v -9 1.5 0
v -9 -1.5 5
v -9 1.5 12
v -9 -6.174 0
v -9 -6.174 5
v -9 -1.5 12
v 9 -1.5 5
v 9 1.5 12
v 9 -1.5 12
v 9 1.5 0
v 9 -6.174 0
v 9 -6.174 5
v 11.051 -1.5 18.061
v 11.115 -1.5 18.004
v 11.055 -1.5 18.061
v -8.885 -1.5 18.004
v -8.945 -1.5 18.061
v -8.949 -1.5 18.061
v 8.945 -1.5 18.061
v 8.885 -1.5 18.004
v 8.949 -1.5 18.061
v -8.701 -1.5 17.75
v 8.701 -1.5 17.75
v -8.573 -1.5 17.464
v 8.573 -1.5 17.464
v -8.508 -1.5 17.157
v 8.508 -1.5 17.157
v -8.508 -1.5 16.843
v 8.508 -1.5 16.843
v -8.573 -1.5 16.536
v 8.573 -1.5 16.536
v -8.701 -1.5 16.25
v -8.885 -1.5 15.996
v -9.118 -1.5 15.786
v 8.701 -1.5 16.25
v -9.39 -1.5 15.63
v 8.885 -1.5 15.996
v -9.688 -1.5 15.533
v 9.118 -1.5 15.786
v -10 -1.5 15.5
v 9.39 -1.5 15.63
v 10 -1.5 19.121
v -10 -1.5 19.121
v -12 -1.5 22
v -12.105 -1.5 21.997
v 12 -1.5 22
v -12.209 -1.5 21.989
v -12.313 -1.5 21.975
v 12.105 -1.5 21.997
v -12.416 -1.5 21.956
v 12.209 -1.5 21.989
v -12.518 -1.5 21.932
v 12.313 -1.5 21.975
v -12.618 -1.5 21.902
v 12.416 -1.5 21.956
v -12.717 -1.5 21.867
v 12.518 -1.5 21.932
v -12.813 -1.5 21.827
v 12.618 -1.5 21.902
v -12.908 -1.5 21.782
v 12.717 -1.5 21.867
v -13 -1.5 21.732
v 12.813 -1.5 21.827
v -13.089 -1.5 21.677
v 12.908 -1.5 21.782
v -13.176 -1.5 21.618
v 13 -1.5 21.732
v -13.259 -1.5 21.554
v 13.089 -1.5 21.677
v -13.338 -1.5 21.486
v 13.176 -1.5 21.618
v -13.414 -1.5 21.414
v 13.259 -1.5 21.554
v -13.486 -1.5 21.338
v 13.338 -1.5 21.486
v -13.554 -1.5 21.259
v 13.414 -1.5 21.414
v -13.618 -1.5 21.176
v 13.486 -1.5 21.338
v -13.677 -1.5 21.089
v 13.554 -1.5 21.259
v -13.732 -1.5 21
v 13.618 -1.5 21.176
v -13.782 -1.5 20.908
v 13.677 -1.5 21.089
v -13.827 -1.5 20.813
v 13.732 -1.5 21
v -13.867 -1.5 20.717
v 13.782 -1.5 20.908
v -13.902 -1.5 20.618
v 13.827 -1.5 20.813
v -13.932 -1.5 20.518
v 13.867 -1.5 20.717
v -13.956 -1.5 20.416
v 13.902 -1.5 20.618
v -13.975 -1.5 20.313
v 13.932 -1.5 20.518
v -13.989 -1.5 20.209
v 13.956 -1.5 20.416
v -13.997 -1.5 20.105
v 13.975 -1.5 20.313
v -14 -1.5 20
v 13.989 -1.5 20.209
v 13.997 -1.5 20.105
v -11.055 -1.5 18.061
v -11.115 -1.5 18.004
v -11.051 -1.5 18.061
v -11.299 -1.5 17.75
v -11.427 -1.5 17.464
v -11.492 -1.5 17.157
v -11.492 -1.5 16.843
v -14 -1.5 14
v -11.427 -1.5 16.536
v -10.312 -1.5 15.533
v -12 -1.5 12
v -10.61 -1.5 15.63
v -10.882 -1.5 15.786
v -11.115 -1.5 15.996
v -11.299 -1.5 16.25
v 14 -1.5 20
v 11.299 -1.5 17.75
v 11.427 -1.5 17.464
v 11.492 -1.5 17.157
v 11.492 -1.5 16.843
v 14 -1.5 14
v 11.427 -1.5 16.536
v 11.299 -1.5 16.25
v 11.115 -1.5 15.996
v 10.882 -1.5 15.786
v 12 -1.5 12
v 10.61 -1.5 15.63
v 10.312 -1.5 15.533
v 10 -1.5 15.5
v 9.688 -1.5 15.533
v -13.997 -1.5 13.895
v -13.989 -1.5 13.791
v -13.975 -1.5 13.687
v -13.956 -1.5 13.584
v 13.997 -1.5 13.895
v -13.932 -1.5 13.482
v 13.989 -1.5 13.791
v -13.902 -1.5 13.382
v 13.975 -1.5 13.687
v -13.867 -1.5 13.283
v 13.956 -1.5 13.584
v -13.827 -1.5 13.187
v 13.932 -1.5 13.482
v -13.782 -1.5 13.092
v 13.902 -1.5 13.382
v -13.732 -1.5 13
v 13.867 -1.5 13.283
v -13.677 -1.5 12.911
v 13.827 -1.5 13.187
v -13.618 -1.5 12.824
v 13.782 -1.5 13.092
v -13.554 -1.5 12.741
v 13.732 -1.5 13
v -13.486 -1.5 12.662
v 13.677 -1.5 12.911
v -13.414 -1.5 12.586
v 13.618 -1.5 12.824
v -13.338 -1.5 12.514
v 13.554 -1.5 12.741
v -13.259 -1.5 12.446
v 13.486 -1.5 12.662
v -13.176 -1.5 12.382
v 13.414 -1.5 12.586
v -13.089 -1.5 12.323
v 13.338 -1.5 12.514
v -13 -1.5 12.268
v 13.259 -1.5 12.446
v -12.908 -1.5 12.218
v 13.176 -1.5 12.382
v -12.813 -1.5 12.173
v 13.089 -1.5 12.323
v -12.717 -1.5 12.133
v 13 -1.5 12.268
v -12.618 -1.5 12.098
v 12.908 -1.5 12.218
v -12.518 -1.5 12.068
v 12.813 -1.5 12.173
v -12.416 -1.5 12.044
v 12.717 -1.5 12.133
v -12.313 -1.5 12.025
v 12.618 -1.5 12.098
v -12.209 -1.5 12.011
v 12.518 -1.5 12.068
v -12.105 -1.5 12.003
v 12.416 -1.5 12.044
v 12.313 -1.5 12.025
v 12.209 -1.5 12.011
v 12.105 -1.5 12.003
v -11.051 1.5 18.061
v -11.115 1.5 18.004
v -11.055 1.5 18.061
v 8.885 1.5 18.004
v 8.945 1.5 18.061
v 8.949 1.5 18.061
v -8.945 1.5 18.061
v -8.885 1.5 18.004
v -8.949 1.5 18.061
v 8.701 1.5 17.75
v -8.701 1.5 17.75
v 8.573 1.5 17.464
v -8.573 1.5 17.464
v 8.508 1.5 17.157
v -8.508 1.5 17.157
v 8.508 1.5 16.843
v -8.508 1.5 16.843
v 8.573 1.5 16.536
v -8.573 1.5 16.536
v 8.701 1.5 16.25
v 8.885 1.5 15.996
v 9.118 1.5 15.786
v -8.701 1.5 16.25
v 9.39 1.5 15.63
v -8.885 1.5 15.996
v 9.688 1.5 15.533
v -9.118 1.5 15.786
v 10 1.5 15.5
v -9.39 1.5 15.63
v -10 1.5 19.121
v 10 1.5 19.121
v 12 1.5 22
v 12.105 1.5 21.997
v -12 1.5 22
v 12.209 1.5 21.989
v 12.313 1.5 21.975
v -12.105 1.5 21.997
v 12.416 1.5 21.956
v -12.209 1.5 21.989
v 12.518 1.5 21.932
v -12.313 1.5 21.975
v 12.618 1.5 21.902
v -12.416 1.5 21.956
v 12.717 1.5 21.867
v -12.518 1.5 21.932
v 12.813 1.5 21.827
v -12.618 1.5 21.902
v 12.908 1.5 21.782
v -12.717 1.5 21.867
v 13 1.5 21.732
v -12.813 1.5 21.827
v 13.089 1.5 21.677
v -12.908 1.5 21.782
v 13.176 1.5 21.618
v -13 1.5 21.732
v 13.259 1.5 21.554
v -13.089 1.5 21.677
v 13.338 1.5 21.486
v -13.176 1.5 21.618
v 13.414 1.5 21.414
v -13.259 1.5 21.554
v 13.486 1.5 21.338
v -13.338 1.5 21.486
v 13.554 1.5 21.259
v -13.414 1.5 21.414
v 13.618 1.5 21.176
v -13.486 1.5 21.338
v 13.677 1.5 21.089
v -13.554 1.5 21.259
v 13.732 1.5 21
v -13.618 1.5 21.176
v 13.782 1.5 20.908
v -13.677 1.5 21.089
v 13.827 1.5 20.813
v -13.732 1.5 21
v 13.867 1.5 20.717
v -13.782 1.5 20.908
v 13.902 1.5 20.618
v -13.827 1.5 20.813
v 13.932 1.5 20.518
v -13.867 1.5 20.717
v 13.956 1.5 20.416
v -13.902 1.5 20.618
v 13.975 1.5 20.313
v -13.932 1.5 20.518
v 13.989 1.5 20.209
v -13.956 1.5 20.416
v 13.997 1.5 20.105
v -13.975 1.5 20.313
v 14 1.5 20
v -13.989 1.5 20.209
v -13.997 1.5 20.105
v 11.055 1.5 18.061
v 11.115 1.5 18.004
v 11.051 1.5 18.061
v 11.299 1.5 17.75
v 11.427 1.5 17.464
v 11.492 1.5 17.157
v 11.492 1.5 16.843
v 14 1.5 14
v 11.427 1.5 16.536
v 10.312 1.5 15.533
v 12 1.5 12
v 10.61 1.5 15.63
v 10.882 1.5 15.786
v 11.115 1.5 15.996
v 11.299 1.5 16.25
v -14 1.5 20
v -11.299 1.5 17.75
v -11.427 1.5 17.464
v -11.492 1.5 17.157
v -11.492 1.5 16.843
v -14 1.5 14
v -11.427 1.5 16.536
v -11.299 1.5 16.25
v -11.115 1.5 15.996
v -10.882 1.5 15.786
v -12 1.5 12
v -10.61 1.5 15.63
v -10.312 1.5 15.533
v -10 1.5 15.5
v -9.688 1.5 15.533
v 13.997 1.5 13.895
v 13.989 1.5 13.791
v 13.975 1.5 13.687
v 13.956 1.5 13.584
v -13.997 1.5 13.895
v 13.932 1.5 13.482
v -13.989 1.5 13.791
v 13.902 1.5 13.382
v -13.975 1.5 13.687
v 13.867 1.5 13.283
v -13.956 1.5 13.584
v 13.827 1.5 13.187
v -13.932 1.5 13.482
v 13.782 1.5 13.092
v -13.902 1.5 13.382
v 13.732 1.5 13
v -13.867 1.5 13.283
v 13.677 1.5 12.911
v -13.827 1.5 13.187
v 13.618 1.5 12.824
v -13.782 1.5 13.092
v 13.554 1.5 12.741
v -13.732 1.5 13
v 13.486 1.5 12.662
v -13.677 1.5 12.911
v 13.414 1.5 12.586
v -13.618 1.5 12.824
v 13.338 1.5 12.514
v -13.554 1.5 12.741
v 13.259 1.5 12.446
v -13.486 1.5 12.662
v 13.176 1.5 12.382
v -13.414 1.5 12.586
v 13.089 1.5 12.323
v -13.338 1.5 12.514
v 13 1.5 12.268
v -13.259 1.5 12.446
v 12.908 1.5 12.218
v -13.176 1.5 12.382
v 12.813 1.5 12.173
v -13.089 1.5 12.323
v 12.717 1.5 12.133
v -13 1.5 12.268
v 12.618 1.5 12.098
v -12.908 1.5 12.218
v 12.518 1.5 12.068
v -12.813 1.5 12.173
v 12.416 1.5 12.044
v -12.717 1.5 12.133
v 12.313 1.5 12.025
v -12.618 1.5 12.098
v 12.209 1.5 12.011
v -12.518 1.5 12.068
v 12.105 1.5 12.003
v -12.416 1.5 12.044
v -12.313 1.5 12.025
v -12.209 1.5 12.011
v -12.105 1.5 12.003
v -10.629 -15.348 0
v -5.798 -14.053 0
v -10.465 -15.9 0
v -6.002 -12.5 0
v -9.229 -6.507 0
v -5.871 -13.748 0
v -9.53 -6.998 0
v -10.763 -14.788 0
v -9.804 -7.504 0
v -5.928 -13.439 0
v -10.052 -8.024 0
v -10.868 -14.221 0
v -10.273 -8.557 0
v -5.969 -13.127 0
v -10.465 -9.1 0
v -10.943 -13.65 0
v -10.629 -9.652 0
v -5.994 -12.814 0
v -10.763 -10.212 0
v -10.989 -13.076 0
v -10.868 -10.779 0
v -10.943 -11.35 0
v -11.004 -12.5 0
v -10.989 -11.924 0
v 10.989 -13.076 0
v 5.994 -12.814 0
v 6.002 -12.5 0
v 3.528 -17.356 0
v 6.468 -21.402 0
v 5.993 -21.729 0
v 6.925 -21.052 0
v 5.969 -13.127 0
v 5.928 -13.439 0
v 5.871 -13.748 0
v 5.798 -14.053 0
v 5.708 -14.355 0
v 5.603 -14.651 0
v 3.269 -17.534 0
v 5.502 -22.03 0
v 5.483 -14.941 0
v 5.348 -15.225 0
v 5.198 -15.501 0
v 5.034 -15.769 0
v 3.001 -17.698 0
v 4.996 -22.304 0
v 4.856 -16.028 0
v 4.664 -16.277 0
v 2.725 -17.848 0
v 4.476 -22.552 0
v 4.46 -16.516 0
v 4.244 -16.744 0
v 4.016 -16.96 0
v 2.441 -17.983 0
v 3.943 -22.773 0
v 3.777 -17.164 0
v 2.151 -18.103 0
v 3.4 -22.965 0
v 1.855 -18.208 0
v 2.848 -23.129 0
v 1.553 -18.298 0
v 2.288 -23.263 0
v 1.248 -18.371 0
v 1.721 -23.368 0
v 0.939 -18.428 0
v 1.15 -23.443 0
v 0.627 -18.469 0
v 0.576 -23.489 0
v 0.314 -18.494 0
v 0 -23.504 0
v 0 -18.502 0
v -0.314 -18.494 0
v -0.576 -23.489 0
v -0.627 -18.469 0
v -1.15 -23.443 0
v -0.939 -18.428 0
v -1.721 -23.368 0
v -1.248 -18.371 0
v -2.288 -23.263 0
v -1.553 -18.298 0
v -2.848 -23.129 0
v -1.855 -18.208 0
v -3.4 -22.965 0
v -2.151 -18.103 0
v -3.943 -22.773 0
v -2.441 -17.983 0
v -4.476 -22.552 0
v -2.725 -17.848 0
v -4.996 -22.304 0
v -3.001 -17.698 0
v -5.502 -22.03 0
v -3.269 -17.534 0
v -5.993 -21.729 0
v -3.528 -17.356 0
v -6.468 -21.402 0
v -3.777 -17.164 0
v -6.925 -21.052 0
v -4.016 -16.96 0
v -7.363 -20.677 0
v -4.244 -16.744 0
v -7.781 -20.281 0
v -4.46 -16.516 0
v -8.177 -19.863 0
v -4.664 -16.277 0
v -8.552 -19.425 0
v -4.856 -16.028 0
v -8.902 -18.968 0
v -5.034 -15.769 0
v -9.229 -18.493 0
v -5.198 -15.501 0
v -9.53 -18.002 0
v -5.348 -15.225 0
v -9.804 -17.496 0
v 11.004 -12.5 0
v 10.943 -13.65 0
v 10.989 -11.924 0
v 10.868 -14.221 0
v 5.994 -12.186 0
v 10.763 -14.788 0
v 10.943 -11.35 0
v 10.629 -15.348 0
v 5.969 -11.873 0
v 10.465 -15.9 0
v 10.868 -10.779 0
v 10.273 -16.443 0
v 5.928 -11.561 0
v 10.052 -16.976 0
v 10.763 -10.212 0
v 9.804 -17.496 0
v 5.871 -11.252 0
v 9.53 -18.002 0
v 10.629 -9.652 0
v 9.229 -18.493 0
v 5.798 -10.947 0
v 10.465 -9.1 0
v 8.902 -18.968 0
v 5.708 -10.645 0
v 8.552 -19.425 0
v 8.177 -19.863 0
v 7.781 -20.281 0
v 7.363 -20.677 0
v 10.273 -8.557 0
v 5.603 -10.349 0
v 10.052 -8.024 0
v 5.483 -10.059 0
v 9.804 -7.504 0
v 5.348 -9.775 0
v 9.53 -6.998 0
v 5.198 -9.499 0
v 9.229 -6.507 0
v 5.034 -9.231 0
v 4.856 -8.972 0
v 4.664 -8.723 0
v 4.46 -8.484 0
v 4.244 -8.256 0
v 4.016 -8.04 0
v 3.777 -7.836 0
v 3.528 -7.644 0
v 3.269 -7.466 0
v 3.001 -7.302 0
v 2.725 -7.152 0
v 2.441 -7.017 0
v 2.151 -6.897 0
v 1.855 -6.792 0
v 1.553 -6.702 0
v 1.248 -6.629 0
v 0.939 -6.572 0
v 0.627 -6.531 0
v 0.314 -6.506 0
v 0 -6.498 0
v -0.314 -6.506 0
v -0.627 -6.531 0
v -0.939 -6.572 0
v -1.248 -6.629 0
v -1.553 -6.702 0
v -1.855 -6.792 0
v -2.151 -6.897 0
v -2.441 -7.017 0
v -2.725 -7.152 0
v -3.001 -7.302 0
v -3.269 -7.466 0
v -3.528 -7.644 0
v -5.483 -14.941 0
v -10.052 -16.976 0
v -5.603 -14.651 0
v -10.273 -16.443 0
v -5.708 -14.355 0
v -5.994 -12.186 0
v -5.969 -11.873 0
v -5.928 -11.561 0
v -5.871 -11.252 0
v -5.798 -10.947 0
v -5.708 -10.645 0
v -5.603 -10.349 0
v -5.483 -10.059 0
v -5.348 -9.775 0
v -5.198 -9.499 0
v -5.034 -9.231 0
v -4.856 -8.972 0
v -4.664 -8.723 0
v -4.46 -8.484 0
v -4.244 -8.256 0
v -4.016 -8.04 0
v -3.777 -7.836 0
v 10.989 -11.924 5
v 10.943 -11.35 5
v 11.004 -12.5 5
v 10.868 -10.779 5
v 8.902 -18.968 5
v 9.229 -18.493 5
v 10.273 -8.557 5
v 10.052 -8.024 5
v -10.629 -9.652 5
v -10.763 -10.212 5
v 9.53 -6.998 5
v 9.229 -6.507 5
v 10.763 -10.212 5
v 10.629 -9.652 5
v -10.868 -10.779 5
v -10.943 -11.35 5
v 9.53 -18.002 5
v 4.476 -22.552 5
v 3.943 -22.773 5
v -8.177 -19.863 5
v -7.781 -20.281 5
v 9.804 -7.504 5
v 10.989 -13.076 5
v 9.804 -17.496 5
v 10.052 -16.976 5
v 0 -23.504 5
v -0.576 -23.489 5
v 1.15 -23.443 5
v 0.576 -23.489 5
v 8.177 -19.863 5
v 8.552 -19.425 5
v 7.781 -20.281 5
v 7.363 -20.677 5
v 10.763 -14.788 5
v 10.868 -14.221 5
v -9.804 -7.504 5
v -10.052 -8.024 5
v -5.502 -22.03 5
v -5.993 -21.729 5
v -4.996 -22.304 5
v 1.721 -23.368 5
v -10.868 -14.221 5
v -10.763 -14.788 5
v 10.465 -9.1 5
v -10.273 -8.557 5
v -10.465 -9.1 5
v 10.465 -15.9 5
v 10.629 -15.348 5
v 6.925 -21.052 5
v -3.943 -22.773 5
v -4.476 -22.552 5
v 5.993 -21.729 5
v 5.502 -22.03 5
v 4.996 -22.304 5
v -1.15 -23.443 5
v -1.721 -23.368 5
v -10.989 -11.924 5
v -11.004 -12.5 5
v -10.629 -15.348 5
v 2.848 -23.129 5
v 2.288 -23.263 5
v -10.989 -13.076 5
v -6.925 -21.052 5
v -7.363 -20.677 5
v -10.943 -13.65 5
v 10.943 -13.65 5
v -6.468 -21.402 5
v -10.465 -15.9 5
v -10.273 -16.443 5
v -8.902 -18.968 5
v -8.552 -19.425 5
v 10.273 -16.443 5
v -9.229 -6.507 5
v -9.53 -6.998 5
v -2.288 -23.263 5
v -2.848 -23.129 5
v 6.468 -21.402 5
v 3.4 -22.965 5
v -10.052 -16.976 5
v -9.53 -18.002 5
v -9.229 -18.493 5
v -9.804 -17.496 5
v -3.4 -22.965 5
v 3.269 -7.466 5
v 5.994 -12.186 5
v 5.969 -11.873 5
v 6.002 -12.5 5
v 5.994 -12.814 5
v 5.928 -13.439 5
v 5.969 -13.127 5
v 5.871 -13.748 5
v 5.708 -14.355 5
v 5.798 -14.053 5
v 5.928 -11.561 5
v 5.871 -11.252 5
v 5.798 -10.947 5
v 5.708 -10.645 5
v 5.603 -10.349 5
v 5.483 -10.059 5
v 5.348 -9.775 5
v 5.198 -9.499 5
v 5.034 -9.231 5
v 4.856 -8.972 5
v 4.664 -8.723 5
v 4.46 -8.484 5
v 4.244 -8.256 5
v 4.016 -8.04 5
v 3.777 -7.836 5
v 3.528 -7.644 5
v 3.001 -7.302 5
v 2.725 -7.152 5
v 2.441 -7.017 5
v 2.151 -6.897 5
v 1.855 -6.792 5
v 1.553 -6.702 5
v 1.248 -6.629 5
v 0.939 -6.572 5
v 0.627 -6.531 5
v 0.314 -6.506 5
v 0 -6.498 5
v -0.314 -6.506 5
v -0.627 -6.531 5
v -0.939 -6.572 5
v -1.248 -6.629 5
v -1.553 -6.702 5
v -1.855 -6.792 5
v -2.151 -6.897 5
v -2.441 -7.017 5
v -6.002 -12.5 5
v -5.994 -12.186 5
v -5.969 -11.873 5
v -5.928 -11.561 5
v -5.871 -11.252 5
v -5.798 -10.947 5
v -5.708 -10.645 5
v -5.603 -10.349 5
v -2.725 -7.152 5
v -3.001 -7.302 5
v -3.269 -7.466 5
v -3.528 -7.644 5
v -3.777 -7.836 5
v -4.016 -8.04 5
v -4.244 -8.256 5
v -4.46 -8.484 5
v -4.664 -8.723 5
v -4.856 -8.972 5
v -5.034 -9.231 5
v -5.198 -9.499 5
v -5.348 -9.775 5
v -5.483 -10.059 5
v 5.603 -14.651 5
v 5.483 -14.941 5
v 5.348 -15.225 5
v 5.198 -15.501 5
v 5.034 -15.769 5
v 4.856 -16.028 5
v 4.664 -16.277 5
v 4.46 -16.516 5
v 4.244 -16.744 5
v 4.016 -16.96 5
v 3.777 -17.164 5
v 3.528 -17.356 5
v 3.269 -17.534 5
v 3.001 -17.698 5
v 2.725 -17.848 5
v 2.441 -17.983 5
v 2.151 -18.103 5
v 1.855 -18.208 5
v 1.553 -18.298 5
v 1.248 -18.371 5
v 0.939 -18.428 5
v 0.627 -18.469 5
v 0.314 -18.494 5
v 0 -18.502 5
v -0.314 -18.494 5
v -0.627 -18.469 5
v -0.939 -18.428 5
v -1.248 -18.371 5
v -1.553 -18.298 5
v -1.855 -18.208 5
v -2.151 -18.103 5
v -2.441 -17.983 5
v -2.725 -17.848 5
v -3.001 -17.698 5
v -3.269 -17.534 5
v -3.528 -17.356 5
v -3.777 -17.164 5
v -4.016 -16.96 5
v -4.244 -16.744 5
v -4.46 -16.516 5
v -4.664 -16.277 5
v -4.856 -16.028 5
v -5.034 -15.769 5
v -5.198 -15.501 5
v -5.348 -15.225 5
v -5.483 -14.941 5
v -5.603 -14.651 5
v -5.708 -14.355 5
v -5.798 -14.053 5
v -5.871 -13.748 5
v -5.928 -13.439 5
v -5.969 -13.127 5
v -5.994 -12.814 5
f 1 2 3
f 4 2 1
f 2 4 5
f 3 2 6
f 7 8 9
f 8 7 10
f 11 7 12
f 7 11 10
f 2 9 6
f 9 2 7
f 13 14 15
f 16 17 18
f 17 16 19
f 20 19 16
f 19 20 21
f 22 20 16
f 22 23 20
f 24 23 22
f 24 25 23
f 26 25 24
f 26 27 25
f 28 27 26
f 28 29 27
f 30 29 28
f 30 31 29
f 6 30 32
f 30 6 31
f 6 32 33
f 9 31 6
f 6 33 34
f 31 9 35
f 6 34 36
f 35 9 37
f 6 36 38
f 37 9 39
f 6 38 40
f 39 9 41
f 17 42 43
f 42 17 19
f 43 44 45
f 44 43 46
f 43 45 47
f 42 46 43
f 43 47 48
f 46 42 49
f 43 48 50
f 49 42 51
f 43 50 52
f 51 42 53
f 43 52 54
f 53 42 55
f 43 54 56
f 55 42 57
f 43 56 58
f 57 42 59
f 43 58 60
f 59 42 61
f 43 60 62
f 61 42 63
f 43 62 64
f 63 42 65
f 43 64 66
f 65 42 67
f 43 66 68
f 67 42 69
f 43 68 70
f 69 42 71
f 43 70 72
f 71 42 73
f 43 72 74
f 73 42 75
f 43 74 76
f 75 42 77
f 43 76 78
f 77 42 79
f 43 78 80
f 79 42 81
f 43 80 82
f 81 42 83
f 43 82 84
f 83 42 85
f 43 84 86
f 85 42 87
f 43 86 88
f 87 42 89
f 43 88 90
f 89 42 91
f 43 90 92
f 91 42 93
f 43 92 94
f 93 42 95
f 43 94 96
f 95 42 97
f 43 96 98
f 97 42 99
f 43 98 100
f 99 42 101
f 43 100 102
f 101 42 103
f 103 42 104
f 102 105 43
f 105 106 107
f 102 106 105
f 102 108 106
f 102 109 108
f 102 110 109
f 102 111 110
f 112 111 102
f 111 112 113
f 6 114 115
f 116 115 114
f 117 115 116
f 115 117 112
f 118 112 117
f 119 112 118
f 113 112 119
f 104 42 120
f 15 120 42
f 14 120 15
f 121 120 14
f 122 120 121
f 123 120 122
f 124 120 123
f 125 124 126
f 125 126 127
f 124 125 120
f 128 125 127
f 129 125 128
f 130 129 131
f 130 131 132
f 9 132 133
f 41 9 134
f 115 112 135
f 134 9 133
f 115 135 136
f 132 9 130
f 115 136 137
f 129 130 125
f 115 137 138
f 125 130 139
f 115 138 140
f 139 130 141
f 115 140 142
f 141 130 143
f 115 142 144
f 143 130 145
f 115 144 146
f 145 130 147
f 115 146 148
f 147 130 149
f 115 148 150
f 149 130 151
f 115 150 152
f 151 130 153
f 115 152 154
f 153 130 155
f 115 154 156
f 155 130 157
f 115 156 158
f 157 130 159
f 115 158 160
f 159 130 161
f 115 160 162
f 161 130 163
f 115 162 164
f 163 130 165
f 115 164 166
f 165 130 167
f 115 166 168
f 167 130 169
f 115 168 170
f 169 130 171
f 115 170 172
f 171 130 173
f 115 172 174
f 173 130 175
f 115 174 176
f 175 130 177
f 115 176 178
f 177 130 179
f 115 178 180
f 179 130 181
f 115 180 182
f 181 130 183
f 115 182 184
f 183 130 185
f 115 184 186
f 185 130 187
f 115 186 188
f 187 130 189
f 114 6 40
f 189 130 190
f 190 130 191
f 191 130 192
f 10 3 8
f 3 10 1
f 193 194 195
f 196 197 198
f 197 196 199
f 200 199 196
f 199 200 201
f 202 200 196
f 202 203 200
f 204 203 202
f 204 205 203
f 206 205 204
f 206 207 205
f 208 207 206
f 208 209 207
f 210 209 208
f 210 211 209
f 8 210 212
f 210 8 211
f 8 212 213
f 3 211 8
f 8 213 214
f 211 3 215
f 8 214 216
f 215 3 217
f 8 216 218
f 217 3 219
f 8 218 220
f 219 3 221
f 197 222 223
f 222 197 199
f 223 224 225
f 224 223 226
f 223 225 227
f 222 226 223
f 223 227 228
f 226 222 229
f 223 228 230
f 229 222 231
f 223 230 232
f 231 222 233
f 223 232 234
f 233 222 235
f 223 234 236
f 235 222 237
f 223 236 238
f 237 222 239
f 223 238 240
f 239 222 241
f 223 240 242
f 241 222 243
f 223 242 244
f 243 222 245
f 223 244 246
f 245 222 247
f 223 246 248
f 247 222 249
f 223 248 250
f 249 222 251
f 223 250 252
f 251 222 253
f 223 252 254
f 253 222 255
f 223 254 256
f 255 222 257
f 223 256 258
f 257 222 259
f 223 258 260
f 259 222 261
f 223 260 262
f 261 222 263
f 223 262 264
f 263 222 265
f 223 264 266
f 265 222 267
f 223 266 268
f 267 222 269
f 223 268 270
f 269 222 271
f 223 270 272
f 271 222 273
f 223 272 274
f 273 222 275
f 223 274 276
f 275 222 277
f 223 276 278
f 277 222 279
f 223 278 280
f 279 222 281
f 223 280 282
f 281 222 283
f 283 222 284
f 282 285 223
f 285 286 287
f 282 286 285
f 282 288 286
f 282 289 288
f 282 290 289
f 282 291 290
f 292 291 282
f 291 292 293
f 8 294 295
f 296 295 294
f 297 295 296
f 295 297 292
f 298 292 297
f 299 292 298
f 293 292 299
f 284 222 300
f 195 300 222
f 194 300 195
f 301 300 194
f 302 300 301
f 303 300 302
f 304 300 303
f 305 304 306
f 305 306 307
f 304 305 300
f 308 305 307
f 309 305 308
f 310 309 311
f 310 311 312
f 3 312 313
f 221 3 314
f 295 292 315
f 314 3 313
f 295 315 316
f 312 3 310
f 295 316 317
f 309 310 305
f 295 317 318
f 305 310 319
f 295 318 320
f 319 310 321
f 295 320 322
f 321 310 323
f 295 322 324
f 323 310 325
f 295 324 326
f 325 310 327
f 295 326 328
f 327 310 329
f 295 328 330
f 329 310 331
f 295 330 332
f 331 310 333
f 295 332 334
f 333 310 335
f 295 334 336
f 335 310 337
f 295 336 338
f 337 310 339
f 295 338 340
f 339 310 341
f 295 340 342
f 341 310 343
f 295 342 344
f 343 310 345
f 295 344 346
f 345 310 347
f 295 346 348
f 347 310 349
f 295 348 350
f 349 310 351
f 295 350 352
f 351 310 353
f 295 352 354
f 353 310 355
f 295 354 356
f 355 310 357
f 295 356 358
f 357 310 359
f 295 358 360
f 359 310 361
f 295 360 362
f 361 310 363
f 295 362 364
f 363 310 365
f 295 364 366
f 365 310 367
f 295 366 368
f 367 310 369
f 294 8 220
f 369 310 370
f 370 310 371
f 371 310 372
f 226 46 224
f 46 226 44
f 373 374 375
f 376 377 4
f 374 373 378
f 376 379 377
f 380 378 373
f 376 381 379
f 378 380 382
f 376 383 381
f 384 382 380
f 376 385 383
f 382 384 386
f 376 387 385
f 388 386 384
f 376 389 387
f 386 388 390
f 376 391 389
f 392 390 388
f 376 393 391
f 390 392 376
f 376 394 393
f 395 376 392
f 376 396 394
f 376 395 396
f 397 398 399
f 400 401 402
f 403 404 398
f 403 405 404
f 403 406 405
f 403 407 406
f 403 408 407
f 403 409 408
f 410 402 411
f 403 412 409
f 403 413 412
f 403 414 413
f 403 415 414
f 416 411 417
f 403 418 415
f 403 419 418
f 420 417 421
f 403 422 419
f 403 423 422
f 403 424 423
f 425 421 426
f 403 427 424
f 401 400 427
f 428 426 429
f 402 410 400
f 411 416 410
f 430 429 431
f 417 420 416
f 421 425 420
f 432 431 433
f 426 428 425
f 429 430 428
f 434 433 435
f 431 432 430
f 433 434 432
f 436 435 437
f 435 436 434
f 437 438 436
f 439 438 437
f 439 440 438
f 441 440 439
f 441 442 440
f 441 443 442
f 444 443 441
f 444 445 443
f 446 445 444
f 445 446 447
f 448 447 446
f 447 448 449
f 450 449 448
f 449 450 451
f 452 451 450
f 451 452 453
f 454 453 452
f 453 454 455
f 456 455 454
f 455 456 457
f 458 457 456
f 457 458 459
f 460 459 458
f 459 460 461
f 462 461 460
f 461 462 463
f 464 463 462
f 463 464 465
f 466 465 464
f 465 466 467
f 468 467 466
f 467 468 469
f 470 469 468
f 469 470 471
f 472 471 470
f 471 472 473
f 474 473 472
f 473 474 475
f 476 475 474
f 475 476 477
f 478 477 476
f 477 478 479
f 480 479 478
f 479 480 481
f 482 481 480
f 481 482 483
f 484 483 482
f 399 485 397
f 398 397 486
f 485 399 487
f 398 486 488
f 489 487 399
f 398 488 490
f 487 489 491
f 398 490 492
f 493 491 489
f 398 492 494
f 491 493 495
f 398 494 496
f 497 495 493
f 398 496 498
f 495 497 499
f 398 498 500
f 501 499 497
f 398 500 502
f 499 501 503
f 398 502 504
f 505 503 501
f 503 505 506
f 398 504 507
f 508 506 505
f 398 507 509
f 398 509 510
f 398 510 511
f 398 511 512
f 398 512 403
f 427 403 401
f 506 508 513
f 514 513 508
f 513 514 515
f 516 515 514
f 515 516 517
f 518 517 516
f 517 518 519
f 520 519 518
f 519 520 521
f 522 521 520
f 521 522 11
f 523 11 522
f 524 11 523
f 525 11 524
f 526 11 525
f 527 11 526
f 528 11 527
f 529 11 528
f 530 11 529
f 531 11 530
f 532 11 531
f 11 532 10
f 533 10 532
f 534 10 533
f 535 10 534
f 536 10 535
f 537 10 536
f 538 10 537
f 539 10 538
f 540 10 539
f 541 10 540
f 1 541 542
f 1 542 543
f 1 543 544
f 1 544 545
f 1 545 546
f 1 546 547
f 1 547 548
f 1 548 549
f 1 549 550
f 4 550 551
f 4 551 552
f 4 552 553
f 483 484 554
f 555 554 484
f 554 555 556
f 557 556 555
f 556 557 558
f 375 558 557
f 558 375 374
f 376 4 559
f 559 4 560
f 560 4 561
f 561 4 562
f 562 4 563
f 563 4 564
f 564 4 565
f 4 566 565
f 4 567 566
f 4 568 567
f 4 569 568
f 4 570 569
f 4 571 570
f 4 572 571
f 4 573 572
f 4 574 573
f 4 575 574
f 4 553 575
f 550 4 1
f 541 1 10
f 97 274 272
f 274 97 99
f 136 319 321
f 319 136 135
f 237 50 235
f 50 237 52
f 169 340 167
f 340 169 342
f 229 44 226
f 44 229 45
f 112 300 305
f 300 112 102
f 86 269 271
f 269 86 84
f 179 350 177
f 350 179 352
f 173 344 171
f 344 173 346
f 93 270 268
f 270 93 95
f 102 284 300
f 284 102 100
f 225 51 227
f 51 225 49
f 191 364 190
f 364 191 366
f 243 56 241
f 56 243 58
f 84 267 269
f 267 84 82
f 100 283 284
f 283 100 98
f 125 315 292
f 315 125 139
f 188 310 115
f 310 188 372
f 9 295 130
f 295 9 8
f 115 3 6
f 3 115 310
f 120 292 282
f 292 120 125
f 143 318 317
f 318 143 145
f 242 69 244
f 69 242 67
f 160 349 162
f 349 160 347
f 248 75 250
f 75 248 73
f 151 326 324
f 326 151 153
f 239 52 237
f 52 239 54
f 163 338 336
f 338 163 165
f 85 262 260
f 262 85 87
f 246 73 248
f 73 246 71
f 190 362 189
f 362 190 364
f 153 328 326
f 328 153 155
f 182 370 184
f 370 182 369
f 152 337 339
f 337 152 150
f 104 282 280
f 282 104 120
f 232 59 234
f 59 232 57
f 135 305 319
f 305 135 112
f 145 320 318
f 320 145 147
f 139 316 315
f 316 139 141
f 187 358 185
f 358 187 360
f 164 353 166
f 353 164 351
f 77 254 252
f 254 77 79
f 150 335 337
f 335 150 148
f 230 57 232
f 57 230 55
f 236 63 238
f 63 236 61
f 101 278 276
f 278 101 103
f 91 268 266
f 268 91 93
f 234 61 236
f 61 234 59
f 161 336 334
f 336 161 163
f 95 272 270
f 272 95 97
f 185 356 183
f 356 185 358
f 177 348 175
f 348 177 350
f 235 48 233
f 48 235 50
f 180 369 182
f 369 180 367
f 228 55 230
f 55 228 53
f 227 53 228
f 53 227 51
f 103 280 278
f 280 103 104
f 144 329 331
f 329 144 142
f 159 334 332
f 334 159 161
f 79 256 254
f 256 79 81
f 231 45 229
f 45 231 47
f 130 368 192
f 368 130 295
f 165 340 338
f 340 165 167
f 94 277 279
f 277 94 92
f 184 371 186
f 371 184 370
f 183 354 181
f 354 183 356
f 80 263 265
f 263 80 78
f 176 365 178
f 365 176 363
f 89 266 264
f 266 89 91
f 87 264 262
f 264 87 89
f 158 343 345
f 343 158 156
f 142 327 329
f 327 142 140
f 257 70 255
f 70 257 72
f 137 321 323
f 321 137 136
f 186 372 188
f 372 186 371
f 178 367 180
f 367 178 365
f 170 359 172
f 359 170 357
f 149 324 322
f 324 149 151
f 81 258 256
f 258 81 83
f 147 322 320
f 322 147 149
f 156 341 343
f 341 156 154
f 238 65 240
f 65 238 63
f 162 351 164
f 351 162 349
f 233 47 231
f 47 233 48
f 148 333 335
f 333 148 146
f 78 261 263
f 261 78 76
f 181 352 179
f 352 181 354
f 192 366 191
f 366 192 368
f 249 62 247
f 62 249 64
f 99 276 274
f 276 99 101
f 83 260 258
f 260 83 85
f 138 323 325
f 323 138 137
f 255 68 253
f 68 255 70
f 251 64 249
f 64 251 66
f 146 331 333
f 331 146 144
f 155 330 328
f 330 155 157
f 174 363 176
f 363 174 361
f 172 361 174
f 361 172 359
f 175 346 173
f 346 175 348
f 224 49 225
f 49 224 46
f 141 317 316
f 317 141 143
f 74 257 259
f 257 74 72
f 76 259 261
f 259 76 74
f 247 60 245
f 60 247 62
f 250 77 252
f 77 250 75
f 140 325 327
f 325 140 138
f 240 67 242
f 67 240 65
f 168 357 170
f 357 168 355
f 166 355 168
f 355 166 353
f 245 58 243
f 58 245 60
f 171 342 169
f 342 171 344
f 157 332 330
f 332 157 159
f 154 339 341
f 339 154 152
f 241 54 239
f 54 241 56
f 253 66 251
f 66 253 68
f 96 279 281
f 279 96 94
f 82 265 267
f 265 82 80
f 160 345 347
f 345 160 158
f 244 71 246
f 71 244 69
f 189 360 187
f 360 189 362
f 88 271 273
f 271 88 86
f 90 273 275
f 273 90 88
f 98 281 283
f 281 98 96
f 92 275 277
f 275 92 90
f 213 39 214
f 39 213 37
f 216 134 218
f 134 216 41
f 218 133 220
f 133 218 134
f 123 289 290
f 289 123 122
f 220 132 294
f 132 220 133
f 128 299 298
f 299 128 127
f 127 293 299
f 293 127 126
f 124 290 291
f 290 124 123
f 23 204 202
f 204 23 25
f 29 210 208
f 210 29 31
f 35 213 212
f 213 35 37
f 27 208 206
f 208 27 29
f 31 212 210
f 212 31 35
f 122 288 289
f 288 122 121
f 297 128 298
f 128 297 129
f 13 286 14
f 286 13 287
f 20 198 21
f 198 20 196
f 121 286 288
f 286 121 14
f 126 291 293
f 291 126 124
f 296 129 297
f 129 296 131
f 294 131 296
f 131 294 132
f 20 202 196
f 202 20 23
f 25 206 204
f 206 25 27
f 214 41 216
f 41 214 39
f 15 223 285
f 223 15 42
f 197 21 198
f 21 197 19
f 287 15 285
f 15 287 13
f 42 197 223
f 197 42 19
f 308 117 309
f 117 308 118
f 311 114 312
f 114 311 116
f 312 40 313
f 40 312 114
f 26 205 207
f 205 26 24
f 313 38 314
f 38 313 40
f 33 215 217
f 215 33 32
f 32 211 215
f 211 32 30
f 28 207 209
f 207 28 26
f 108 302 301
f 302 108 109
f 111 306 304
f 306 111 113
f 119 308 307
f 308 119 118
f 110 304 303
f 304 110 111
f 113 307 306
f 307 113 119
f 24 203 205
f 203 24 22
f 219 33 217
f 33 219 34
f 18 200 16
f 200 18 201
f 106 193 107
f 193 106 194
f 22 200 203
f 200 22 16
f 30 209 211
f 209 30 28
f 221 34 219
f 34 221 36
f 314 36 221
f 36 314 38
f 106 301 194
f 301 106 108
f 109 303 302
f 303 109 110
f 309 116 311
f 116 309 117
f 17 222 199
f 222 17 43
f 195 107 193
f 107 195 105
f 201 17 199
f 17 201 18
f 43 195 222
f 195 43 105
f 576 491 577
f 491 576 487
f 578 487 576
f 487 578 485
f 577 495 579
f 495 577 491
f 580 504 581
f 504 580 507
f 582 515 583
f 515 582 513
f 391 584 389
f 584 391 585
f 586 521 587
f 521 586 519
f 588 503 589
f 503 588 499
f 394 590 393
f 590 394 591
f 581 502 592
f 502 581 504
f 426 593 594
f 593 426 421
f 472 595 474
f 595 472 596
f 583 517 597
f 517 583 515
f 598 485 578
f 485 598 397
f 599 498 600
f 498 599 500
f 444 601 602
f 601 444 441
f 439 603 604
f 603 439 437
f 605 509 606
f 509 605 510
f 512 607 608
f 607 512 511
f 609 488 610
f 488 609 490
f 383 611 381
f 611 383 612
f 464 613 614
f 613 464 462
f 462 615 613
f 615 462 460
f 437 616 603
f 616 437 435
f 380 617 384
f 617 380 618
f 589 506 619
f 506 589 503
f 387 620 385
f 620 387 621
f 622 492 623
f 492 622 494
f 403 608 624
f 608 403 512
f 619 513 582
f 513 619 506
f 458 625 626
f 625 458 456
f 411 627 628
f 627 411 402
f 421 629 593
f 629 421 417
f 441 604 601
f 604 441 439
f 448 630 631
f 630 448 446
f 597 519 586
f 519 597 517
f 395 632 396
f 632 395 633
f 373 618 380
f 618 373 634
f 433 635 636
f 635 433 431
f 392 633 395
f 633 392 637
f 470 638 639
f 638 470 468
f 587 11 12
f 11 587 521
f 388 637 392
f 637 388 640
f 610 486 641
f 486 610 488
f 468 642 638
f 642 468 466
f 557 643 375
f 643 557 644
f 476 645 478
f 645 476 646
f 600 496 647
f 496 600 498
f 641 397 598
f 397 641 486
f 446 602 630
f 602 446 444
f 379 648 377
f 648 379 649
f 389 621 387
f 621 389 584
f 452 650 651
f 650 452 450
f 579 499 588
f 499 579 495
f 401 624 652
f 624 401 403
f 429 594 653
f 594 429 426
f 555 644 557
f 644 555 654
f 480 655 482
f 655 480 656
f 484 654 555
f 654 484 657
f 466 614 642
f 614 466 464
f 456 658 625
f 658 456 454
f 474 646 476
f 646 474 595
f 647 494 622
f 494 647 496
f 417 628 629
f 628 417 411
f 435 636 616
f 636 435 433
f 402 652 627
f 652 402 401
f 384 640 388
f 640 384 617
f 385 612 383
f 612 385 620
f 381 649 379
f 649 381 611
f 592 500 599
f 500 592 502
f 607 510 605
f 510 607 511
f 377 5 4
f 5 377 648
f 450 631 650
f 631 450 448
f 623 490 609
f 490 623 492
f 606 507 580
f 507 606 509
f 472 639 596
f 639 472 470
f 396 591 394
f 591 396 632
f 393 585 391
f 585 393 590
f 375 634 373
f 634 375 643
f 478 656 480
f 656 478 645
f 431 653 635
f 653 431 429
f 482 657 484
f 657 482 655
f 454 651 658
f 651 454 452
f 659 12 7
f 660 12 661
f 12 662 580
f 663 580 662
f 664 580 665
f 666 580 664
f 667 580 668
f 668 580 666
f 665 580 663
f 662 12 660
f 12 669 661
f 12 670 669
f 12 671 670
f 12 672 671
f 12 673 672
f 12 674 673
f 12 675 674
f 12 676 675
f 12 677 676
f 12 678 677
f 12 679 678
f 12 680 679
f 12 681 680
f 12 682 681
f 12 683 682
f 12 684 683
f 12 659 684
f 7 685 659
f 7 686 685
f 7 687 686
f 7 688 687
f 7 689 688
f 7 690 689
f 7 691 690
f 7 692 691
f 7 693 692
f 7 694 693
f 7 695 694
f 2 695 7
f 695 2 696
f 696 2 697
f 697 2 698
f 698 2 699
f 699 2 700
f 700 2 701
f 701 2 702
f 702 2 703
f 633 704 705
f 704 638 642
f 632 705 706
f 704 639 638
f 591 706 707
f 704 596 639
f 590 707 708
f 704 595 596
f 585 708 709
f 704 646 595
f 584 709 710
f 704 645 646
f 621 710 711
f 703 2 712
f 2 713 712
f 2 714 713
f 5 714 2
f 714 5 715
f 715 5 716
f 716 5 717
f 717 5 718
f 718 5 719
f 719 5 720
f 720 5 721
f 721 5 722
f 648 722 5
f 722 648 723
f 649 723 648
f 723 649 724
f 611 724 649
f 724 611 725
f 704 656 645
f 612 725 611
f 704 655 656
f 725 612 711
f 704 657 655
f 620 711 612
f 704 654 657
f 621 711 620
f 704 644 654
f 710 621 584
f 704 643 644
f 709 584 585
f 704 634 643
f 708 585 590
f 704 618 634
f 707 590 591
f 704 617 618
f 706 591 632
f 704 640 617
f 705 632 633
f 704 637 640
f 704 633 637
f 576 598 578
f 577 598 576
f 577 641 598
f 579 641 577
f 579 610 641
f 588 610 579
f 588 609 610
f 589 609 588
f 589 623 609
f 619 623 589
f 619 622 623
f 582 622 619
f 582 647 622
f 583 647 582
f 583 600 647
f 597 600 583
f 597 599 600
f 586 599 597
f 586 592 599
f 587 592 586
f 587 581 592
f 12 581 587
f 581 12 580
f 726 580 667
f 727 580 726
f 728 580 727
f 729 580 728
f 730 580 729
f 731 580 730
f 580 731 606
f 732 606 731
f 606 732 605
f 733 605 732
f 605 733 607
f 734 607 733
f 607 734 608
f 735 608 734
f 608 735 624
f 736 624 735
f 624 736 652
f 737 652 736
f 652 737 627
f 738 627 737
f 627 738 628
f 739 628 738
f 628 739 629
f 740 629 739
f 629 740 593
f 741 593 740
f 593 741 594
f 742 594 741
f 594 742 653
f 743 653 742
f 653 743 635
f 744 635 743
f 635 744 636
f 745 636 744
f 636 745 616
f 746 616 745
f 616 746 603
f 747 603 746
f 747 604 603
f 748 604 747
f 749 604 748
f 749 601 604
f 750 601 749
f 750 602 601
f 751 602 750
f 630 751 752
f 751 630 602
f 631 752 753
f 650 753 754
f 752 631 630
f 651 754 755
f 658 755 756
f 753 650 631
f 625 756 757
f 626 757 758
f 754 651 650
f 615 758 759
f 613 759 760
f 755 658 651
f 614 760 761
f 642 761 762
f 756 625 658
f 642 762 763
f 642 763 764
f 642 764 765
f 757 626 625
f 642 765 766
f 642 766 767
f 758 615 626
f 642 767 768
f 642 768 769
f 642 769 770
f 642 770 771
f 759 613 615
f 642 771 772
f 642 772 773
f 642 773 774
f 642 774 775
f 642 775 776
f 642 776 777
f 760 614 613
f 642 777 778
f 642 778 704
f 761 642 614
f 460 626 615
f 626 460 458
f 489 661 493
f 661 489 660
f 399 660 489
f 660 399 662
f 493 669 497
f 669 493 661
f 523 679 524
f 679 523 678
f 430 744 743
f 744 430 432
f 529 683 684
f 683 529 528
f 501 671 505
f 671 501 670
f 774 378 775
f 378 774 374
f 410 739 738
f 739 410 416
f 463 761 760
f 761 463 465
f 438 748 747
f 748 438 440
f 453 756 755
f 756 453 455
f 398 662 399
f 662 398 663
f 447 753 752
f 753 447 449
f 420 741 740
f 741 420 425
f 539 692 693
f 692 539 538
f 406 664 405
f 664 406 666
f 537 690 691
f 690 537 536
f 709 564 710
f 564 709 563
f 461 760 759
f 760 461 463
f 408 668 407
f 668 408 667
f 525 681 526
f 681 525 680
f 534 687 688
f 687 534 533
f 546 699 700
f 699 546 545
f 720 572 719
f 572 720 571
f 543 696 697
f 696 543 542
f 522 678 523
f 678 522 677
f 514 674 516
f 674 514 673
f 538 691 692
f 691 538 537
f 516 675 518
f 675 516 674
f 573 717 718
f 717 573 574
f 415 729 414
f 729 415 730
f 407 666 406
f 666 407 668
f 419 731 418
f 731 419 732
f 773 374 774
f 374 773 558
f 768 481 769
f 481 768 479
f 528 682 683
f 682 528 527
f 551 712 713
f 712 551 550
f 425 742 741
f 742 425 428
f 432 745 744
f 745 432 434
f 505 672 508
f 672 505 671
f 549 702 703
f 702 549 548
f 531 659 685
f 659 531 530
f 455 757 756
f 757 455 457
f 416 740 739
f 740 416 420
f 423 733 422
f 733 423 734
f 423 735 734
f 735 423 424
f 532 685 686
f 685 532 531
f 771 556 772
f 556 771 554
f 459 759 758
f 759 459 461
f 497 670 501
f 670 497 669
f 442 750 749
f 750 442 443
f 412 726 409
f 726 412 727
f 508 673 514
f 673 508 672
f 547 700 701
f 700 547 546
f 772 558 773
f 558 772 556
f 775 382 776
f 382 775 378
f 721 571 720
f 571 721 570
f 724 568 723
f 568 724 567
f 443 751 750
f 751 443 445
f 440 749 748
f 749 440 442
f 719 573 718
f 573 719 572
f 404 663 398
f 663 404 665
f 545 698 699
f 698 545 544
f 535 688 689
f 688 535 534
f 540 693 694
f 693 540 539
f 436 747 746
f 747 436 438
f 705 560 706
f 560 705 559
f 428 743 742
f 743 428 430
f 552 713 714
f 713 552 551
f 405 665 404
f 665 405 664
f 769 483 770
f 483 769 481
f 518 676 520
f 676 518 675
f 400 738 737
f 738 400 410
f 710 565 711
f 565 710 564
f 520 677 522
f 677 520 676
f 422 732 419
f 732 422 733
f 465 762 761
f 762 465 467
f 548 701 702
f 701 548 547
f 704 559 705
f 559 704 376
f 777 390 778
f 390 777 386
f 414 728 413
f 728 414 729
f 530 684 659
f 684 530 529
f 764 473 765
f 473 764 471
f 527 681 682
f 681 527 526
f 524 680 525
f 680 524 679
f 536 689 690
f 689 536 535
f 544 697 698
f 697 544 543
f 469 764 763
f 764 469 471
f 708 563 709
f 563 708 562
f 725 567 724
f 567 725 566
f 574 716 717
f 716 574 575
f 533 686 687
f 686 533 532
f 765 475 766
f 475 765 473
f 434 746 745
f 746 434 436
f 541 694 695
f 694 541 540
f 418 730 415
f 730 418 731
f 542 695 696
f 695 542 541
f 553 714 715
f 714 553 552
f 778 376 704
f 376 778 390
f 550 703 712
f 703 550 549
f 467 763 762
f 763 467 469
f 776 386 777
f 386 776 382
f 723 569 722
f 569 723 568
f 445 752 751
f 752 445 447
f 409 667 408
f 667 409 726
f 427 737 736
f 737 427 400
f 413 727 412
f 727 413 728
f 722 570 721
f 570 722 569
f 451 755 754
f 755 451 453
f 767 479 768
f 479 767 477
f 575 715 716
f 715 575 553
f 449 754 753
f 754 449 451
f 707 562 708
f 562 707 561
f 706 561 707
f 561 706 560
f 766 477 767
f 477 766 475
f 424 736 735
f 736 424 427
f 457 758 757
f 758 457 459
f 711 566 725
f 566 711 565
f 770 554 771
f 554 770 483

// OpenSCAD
// Customizable Probe Mount
// Copyright: Olle Wreede 2019
// License: CC BY-SA

//CUSTOMIZER VARIABLES

// Height in mm of backplate
backplate_height = 22; // [16:30]

// Thickness in mm of backplate
backplate_thickness = 3; // [2:0.1:6]

// Width in mm of bracket
backplate_bracket_width = 28; // [20:0.5:30]

// Height in mm of bracket
backplate_bracket_height = 10; // [6:15]

// Radius in mm of bracket corners
backplate_corner_radius = 2; // [0:0.1:4]

// Width in mm of backplate holder
backplate_holder_width = 18; // [10:30]

// Shape of backplate
backplate_shape = "T shape"; // [T shape, V shape, Rectangle]

// Diameter in mm of probe mount hole
probe_hole_diameter = 12; // [10:0.5:20]

// Thickness in mm of probe mount holder
probe_mount_thickness = 5; // [2:0.5:8]

// Diameter in mm of probe mount holder
probe_mount_diameter = 22; // [20:30]

// Shape of mount screw holes
type_of_mount_hole = "Teardrop"; // [Teardrop, Round]

// Diameter in mm of mount screw holes
mount_hole_diameter = 3;

// Distance in mm between mount screw holes
mount_hole_distance = 10;

//CUSTOMIZER VARIABLES END

/* [Hidden] */

$fn=120;

/* From http://www.thingiverse.com/thing:3457
   © 2010 whosawhatsis */
module teardrop(radius, length, angle) {
	rotate([0, angle, 0]) union() {
		linear_extrude(height = length, center = true, convexity = radius, twist = 0)
			circle(r = radius, center = true, $fn = 30);
		linear_extrude(height = length, center = true, convexity = radius, twist = 0)
			projection(cut = false) rotate([0, -angle, 0]) translate([0, 0, radius * sin(45) * 1.5]) cylinder(h = radius * sin(45), r1 = radius * sin(45), r2 = 0, center = true, $fn = 30);
    }
}

module cylinder_outer(diameter, height, fn) {
   fudge = 1 / cos(180 / fn);
   cylinder(h=height, r=diameter / 2 * fudge, $fn=fn, center=true);
}

module cube_rounded(width, height, thickness, radius=1) {
	minkowski() {
		cube([width - 2 * radius, height - 2 * radius, thickness/2], center = true);
		cylinder(r = radius, h = thickness/2, center = true);
	}
}

module round_hole() {
    rotate([90, 0, 0])
    cylinder_outer(mount_hole_diameter, backplate_thickness, $fn);
}

module teardrop_hole() {
    rotate([0, 0, 90])
    teardrop(mount_hole_diameter/2, backplate_thickness, 90);
}

module mount_hole() {
    if (type_of_mount_hole == "Teardrop") {
        teardrop_hole();
    } else {
        round_hole();
    }
}

module mount_holes() {
    translate([mount_hole_distance, 0, backplate_height/2 - backplate_bracket_height/2])
        mount_hole();
    
    translate([-mount_hole_distance, 0, backplate_height/2 - backplate_bracket_height/2])
        mount_hole();
}

module backplate_rectangle() {
    difference() {
        cube([backplate_bracket_width, backplate_thickness, backplate_height], center = true);
        
        mount_holes();
    }
}

module backplate_tshape() {
    difference() {
        union() {
            rotate([90, 0, 0])
            cube([backplate_holder_width, backplate_height, backplate_thickness], center = true);
            
            translate([0, 0, backplate_height/2 - backplate_bracket_height/2])
            rotate([90, 0, 0])
            cube_rounded(backplate_bracket_width, backplate_bracket_height, backplate_thickness, backplate_corner_radius);
        }
        
        mount_holes();
    }
}

module backplate_vshape() {
    difference() {
        hull() {
            rotate([90, 0, 0])
            cube([backplate_holder_width, backplate_height, backplate_thickness], center = true);
            
            translate([0, 0, backplate_height/2 - backplate_bracket_height/2])
            rotate([90, 0, 0])
            cube_rounded(backplate_bracket_width, backplate_bracket_height, backplate_thickness, backplate_corner_radius);
        }
        
        mount_holes();
    }
}


module mount() {
    translate([0, 0, probe_mount_thickness/2 - backplate_height/2])
    difference() {
        union() {
            translate([0, -probe_mount_diameter/2 - backplate_thickness/2, 0])
            cylinder_outer(probe_mount_diameter, probe_mount_thickness, $fn);
            
            translate([0, -probe_mount_diameter/4, 0])
            cube([backplate_holder_width, probe_mount_diameter/2, probe_mount_thickness], center=true);
        }
        
        translate([0, -probe_mount_diameter/2 - backplate_thickness/2, 0])
        cylinder_outer(probe_hole_diameter, probe_mount_thickness, $fn);
    }
}

module probe_mount() {
    translate([0, 0, backplate_height/2]) {
        if (backplate_shape == "T shape") {
            backplate_tshape();
        } else if (backplate_shape == "V shape") {
            backplate_vshape();
        } else {
            backplate_rectangle();
        }
        mount();
    }
}

probe_mount();
